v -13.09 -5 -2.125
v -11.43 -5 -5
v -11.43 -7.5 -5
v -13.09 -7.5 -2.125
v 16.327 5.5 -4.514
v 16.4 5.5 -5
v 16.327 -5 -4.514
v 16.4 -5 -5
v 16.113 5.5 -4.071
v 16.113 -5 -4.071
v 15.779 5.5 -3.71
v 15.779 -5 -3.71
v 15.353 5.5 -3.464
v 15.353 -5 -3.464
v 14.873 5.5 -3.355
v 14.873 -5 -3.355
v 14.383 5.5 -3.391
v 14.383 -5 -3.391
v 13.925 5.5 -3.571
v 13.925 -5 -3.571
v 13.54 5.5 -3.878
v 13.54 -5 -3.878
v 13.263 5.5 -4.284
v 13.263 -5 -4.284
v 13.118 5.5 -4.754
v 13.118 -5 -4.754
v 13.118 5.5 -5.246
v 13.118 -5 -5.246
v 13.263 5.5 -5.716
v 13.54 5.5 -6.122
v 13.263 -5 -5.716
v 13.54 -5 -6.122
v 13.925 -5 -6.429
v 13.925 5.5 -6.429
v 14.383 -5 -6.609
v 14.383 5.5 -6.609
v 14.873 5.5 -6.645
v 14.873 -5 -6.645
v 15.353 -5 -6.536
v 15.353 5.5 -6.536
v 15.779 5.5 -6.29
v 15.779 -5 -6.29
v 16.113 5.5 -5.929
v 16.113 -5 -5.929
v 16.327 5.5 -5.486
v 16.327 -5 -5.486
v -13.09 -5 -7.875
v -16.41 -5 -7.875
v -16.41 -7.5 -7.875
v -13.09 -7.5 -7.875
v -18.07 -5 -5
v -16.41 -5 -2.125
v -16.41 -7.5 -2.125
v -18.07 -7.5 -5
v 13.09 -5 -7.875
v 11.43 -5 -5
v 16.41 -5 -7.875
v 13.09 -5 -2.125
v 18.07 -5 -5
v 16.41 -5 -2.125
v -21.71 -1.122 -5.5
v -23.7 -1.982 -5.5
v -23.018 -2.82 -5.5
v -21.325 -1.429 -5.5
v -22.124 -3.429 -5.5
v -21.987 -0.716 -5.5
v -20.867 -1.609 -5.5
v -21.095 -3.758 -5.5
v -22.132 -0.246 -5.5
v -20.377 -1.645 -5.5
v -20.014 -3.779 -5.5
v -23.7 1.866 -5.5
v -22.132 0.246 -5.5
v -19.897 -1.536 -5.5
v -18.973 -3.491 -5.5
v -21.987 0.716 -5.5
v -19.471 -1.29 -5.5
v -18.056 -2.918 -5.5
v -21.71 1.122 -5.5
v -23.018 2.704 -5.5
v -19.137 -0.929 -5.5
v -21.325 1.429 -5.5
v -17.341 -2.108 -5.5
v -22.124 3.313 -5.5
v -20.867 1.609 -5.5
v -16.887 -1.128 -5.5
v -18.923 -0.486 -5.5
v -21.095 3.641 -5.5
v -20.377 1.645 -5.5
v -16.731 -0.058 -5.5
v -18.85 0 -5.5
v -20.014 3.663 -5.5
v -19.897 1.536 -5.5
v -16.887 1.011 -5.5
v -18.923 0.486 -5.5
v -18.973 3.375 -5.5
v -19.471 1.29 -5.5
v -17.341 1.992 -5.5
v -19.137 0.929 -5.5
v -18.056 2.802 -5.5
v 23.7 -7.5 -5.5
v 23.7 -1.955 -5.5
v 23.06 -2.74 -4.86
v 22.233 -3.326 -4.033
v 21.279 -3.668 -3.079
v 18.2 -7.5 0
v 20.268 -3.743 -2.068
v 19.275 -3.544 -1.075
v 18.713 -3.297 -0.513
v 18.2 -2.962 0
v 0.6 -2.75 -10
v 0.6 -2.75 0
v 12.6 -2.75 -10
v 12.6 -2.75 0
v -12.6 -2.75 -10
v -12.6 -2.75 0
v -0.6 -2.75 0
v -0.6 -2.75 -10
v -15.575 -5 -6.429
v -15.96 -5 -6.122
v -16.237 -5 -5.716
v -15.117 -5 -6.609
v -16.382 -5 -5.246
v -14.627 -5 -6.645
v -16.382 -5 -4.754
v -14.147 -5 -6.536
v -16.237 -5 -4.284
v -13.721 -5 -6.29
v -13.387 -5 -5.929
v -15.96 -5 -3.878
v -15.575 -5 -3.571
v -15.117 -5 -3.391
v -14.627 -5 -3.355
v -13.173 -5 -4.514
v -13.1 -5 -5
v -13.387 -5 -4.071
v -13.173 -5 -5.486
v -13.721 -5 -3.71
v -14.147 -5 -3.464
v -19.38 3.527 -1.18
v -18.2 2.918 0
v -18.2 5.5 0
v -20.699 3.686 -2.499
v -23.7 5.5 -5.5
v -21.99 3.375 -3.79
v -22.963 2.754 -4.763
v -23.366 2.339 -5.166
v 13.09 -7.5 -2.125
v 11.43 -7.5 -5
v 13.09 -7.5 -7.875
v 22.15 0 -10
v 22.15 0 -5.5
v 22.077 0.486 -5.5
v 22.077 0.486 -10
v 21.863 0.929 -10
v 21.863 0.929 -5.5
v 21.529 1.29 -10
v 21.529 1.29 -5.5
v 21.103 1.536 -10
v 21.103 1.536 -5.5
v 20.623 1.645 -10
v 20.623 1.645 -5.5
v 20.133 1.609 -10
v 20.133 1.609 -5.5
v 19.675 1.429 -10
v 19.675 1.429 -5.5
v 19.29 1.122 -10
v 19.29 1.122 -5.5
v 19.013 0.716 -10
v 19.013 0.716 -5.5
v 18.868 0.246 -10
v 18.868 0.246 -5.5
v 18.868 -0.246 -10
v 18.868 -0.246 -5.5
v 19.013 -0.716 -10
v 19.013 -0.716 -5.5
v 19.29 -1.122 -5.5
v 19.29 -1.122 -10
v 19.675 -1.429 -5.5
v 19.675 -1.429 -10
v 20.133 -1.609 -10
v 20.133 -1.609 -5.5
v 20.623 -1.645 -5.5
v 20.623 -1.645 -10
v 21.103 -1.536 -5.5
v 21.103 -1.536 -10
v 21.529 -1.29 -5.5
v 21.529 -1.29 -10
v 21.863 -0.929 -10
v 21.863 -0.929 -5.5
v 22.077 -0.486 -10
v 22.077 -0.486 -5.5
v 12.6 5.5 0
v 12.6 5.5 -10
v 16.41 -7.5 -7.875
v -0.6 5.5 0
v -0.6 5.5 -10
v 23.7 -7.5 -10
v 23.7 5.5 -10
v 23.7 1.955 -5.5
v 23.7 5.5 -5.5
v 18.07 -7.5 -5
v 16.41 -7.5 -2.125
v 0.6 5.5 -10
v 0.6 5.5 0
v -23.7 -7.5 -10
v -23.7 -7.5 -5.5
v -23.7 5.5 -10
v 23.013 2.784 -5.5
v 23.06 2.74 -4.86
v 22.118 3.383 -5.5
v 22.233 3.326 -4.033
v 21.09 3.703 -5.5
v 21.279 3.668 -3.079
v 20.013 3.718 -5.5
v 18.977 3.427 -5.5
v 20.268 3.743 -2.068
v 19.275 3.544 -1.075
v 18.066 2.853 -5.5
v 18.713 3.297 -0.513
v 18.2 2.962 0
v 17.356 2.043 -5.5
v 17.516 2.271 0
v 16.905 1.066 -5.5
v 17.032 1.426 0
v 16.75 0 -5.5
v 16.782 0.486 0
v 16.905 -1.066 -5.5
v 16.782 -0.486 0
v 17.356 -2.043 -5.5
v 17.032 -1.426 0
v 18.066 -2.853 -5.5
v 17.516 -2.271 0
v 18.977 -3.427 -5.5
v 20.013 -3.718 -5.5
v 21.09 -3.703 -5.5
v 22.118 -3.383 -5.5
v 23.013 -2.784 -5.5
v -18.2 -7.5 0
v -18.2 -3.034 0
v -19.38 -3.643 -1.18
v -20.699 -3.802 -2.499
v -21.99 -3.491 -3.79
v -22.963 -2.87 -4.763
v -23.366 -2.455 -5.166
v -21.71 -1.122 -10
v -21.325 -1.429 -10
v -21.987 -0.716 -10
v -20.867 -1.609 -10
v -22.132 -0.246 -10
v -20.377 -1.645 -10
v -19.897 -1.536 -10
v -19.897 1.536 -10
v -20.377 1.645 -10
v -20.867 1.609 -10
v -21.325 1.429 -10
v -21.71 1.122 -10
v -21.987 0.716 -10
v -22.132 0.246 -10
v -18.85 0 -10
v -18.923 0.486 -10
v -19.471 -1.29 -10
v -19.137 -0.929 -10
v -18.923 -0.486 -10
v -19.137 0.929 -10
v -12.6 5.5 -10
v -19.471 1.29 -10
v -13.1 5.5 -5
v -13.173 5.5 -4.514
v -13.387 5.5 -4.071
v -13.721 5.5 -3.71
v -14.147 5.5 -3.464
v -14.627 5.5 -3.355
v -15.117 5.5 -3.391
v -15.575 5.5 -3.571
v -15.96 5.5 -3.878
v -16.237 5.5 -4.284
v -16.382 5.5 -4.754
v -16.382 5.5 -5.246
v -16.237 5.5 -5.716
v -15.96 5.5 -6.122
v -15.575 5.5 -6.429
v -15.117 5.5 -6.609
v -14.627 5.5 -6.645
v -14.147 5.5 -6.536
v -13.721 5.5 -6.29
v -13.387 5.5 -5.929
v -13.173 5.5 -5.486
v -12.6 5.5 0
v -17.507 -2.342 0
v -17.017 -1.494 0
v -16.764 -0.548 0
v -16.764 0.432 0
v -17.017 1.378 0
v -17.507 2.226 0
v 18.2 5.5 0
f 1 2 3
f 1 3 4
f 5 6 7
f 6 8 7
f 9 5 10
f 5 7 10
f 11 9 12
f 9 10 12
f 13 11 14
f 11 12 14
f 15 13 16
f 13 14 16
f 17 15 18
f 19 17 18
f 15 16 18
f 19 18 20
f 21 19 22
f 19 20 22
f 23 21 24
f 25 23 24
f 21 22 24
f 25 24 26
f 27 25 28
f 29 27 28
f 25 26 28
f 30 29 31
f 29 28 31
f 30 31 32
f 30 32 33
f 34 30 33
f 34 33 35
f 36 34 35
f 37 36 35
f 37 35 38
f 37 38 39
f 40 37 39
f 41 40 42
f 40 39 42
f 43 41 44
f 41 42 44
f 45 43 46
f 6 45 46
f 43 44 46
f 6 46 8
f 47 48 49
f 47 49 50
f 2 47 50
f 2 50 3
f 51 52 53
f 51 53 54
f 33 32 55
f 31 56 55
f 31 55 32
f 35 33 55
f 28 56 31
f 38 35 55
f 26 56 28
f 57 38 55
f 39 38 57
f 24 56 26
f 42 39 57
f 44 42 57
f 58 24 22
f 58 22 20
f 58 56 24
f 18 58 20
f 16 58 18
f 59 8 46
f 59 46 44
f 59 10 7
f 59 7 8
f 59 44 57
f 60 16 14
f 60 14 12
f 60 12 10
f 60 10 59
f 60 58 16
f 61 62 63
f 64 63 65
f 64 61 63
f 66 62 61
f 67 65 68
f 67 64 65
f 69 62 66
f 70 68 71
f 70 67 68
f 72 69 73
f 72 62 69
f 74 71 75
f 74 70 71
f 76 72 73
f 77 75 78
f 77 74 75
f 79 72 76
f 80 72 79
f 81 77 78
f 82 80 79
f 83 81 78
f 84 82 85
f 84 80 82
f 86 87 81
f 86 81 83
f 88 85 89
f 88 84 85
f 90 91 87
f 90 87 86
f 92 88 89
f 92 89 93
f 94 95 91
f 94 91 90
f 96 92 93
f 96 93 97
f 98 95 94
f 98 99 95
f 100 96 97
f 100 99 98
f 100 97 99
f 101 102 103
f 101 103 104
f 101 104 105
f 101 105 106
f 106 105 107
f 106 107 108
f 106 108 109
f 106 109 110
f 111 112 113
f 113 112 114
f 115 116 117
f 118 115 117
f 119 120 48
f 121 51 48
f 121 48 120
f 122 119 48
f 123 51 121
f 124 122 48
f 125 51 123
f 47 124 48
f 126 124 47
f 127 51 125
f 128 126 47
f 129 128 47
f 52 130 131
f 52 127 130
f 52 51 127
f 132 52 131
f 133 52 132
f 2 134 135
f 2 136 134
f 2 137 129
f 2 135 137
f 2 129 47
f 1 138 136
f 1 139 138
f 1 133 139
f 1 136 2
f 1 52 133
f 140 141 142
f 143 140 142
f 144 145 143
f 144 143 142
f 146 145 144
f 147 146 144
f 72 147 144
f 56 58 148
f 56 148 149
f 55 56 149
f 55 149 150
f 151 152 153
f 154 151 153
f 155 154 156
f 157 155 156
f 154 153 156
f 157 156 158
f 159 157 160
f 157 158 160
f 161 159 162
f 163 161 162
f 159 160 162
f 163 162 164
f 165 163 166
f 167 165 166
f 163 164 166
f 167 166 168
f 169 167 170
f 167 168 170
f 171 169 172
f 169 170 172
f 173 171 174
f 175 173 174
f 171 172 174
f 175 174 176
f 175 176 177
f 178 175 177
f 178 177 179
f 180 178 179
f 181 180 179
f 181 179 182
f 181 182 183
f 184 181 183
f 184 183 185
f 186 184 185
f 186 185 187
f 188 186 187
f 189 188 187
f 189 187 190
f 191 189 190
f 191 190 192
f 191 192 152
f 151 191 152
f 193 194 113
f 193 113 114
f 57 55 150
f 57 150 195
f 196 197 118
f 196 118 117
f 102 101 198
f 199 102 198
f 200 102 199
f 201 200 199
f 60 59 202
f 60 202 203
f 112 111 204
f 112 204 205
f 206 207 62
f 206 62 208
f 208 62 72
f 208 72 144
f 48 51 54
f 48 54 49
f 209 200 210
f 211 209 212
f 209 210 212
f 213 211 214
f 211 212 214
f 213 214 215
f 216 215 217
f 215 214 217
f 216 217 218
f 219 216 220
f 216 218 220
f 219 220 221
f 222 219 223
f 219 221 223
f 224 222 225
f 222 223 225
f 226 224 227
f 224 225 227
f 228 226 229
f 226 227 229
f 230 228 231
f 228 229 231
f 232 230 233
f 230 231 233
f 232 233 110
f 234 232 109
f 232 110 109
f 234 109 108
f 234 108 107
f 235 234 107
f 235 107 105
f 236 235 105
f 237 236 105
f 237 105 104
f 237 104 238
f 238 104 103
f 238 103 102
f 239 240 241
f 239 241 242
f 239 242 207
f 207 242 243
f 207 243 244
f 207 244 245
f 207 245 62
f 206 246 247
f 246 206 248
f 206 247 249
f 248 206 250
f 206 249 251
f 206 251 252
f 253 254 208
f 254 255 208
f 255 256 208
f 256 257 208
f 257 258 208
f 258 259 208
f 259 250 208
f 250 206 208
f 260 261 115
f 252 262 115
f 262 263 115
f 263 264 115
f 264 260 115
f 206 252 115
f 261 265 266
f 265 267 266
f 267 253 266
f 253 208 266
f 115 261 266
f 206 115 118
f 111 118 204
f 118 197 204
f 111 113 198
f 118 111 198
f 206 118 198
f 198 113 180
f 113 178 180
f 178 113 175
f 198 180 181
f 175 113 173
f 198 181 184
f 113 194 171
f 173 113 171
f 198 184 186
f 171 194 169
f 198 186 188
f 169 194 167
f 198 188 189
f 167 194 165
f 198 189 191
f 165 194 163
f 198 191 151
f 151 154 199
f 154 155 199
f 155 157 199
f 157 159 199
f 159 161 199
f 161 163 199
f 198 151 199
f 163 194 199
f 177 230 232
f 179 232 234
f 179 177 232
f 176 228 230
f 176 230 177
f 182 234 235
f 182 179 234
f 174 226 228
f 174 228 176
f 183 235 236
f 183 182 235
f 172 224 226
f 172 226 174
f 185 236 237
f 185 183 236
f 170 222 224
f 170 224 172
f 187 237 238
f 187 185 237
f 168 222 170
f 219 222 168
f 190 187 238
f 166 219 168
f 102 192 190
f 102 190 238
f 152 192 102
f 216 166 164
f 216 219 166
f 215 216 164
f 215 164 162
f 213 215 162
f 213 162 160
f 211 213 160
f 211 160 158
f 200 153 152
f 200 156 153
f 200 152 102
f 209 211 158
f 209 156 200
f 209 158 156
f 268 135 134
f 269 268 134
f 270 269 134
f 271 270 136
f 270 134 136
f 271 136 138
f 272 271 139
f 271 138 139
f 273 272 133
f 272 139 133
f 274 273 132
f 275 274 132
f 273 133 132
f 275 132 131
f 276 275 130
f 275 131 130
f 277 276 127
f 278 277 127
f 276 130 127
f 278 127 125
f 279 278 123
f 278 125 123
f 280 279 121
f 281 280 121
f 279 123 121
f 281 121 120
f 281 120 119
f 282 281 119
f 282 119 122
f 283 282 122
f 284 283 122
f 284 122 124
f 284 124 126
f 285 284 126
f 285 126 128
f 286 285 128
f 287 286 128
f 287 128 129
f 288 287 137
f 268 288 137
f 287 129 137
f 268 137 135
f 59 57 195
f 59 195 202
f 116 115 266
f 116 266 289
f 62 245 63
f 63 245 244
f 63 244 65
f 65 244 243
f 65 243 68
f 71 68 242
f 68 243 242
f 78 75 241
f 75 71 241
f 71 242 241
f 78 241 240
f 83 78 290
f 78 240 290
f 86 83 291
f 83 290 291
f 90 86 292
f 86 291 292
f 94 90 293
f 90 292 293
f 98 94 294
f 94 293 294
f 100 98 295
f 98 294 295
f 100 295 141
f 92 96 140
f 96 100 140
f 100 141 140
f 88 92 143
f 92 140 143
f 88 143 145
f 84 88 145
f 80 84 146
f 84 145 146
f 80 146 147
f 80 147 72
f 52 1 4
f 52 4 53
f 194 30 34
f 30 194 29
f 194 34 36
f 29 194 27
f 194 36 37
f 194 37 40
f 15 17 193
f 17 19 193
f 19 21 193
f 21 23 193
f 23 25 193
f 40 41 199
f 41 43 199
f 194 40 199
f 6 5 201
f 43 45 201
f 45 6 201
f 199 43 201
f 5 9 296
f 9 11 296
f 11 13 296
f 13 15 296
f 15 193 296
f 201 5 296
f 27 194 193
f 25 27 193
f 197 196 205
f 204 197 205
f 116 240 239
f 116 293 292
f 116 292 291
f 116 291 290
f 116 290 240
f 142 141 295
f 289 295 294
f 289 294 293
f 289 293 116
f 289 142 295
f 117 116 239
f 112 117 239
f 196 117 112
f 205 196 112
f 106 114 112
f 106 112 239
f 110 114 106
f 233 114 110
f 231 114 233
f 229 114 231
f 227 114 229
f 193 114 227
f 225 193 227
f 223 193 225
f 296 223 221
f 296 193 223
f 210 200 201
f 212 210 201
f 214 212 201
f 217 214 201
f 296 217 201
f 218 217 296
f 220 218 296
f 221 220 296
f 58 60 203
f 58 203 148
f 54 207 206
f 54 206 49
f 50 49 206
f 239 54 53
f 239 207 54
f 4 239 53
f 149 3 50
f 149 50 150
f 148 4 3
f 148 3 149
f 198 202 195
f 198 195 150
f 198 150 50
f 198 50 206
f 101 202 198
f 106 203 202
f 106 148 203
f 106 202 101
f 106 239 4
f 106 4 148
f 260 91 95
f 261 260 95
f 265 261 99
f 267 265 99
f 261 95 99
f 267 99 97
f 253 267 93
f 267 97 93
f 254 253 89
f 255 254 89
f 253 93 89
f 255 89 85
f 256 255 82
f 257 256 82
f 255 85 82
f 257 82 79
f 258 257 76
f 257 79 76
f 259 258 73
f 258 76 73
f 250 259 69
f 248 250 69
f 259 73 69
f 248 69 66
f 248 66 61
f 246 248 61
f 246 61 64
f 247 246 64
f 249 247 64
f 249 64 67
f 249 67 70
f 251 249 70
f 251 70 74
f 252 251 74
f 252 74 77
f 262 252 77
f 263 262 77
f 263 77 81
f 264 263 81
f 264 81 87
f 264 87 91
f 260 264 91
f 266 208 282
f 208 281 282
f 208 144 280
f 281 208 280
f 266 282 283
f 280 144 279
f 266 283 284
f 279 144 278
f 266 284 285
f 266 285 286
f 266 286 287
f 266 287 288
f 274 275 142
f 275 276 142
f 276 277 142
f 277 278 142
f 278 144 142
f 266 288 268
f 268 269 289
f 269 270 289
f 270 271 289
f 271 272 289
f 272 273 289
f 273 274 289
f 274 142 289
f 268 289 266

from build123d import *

# Parameters (mm, degrees)
SKETCH_W             = 47.4
SKETCH_H             = 13
SKETCH_R             = 1.65
PAD_DEPTH            = 10
SKETCH001_R          = 3.75
POCKET_DEPTH         = 5.5
SKETCH002_W          = 12
SKETCH002_H          = 10
POCKET001_DEPTH      = 100
POCKET001_DEPTH_BACK = -2.75
SKETCH003_R          = 1.65
POCKET002_DEPTH      = 5.501
POCKET002_DEPTH_BACK = -7.501
POCKET003_DEPTH      = 5.501
POCKET003_DEPTH_BACK = -7.501
POCKET004_DEPTH      = 2.501


with BuildPart() as part:
    # Sketch → Pad (new body)
    with BuildSketch(Plane.XY):
        with Locations((0, -1)):
            Rectangle(SKETCH_W, SKETCH_H)
        with Locations((-20.5, 0)):
            Circle(SKETCH_R, mode=Mode.SUBTRACT)
        with Locations((20.5, 0)):
            Circle(SKETCH_R, mode=Mode.SUBTRACT)
    extrude(amount=-PAD_DEPTH)

    # Sketch001 → Pocket (cut)
    with BuildSketch(Plane.XY):
        with Locations((-20.481411, -0.058129)):
            Circle(SKETCH001_R)
        with Locations((20.5, 0)):
            Circle(SKETCH001_R)
    extrude(amount=-POCKET_DEPTH, mode=Mode.SUBTRACT)

    # Sketch002 → Pocket001 (cut, two sides)
    with BuildSketch(Plane.XZ) as pocket001_sk:
        with Locations((-6.6, -5)):
            Rectangle(SKETCH002_W, SKETCH002_H)
        with Locations((6.6, -5)):
            Rectangle(SKETCH002_W, SKETCH002_H)
    extrude(amount=-POCKET001_DEPTH, mode=Mode.SUBTRACT)
    extrude(pocket001_sk.sketch, amount=-POCKET001_DEPTH_BACK, mode=Mode.SUBTRACT)

    # Sketch003 → Pocket002 (cut, two sides)
    with BuildSketch(Plane.XZ) as pocket002_sk:
        with Locations((-14.75, -5)):
            Circle(SKETCH003_R)
        with Locations((14.75, -5)):
            Circle(SKETCH003_R)
    extrude(amount=-POCKET002_DEPTH, mode=Mode.SUBTRACT)
    extrude(pocket002_sk.sketch, amount=-POCKET002_DEPTH_BACK, mode=Mode.SUBTRACT)

    # Sketch004 → Pocket003 (cut, two sides)
    with BuildSketch(Plane.XZ) as pocket003_sk:
        Polygon((-18.2, 0), (-23.7, -5.5), (-23.7, 0), align=None)
        Polygon((18.2, 0), (23.7, 0), (23.7, -5.5), align=None)
    extrude(amount=-POCKET003_DEPTH, mode=Mode.SUBTRACT)
    extrude(pocket003_sk.sketch, amount=-POCKET003_DEPTH_BACK, mode=Mode.SUBTRACT)

    # Sketch005 (on DatumPlane) → Pocket004 (cut, through all)
    with BuildSketch(Plane.XZ.offset(5)):
        Polygon((-13.090118, -7.875), (-11.430236, -5), (-13.090118, -2.125), (-16.409882, -2.125), (-18.069764, -5), (-16.409882, -7.875), align=None)
        Polygon((16.409882, -7.875), (18.069764, -5), (16.409882, -2.125), (13.090118, -2.125), (11.430236, -5), (13.090118, -7.875), align=None)
    extrude(amount=POCKET004_DEPTH, mode=Mode.SUBTRACT)


solid = part.part
